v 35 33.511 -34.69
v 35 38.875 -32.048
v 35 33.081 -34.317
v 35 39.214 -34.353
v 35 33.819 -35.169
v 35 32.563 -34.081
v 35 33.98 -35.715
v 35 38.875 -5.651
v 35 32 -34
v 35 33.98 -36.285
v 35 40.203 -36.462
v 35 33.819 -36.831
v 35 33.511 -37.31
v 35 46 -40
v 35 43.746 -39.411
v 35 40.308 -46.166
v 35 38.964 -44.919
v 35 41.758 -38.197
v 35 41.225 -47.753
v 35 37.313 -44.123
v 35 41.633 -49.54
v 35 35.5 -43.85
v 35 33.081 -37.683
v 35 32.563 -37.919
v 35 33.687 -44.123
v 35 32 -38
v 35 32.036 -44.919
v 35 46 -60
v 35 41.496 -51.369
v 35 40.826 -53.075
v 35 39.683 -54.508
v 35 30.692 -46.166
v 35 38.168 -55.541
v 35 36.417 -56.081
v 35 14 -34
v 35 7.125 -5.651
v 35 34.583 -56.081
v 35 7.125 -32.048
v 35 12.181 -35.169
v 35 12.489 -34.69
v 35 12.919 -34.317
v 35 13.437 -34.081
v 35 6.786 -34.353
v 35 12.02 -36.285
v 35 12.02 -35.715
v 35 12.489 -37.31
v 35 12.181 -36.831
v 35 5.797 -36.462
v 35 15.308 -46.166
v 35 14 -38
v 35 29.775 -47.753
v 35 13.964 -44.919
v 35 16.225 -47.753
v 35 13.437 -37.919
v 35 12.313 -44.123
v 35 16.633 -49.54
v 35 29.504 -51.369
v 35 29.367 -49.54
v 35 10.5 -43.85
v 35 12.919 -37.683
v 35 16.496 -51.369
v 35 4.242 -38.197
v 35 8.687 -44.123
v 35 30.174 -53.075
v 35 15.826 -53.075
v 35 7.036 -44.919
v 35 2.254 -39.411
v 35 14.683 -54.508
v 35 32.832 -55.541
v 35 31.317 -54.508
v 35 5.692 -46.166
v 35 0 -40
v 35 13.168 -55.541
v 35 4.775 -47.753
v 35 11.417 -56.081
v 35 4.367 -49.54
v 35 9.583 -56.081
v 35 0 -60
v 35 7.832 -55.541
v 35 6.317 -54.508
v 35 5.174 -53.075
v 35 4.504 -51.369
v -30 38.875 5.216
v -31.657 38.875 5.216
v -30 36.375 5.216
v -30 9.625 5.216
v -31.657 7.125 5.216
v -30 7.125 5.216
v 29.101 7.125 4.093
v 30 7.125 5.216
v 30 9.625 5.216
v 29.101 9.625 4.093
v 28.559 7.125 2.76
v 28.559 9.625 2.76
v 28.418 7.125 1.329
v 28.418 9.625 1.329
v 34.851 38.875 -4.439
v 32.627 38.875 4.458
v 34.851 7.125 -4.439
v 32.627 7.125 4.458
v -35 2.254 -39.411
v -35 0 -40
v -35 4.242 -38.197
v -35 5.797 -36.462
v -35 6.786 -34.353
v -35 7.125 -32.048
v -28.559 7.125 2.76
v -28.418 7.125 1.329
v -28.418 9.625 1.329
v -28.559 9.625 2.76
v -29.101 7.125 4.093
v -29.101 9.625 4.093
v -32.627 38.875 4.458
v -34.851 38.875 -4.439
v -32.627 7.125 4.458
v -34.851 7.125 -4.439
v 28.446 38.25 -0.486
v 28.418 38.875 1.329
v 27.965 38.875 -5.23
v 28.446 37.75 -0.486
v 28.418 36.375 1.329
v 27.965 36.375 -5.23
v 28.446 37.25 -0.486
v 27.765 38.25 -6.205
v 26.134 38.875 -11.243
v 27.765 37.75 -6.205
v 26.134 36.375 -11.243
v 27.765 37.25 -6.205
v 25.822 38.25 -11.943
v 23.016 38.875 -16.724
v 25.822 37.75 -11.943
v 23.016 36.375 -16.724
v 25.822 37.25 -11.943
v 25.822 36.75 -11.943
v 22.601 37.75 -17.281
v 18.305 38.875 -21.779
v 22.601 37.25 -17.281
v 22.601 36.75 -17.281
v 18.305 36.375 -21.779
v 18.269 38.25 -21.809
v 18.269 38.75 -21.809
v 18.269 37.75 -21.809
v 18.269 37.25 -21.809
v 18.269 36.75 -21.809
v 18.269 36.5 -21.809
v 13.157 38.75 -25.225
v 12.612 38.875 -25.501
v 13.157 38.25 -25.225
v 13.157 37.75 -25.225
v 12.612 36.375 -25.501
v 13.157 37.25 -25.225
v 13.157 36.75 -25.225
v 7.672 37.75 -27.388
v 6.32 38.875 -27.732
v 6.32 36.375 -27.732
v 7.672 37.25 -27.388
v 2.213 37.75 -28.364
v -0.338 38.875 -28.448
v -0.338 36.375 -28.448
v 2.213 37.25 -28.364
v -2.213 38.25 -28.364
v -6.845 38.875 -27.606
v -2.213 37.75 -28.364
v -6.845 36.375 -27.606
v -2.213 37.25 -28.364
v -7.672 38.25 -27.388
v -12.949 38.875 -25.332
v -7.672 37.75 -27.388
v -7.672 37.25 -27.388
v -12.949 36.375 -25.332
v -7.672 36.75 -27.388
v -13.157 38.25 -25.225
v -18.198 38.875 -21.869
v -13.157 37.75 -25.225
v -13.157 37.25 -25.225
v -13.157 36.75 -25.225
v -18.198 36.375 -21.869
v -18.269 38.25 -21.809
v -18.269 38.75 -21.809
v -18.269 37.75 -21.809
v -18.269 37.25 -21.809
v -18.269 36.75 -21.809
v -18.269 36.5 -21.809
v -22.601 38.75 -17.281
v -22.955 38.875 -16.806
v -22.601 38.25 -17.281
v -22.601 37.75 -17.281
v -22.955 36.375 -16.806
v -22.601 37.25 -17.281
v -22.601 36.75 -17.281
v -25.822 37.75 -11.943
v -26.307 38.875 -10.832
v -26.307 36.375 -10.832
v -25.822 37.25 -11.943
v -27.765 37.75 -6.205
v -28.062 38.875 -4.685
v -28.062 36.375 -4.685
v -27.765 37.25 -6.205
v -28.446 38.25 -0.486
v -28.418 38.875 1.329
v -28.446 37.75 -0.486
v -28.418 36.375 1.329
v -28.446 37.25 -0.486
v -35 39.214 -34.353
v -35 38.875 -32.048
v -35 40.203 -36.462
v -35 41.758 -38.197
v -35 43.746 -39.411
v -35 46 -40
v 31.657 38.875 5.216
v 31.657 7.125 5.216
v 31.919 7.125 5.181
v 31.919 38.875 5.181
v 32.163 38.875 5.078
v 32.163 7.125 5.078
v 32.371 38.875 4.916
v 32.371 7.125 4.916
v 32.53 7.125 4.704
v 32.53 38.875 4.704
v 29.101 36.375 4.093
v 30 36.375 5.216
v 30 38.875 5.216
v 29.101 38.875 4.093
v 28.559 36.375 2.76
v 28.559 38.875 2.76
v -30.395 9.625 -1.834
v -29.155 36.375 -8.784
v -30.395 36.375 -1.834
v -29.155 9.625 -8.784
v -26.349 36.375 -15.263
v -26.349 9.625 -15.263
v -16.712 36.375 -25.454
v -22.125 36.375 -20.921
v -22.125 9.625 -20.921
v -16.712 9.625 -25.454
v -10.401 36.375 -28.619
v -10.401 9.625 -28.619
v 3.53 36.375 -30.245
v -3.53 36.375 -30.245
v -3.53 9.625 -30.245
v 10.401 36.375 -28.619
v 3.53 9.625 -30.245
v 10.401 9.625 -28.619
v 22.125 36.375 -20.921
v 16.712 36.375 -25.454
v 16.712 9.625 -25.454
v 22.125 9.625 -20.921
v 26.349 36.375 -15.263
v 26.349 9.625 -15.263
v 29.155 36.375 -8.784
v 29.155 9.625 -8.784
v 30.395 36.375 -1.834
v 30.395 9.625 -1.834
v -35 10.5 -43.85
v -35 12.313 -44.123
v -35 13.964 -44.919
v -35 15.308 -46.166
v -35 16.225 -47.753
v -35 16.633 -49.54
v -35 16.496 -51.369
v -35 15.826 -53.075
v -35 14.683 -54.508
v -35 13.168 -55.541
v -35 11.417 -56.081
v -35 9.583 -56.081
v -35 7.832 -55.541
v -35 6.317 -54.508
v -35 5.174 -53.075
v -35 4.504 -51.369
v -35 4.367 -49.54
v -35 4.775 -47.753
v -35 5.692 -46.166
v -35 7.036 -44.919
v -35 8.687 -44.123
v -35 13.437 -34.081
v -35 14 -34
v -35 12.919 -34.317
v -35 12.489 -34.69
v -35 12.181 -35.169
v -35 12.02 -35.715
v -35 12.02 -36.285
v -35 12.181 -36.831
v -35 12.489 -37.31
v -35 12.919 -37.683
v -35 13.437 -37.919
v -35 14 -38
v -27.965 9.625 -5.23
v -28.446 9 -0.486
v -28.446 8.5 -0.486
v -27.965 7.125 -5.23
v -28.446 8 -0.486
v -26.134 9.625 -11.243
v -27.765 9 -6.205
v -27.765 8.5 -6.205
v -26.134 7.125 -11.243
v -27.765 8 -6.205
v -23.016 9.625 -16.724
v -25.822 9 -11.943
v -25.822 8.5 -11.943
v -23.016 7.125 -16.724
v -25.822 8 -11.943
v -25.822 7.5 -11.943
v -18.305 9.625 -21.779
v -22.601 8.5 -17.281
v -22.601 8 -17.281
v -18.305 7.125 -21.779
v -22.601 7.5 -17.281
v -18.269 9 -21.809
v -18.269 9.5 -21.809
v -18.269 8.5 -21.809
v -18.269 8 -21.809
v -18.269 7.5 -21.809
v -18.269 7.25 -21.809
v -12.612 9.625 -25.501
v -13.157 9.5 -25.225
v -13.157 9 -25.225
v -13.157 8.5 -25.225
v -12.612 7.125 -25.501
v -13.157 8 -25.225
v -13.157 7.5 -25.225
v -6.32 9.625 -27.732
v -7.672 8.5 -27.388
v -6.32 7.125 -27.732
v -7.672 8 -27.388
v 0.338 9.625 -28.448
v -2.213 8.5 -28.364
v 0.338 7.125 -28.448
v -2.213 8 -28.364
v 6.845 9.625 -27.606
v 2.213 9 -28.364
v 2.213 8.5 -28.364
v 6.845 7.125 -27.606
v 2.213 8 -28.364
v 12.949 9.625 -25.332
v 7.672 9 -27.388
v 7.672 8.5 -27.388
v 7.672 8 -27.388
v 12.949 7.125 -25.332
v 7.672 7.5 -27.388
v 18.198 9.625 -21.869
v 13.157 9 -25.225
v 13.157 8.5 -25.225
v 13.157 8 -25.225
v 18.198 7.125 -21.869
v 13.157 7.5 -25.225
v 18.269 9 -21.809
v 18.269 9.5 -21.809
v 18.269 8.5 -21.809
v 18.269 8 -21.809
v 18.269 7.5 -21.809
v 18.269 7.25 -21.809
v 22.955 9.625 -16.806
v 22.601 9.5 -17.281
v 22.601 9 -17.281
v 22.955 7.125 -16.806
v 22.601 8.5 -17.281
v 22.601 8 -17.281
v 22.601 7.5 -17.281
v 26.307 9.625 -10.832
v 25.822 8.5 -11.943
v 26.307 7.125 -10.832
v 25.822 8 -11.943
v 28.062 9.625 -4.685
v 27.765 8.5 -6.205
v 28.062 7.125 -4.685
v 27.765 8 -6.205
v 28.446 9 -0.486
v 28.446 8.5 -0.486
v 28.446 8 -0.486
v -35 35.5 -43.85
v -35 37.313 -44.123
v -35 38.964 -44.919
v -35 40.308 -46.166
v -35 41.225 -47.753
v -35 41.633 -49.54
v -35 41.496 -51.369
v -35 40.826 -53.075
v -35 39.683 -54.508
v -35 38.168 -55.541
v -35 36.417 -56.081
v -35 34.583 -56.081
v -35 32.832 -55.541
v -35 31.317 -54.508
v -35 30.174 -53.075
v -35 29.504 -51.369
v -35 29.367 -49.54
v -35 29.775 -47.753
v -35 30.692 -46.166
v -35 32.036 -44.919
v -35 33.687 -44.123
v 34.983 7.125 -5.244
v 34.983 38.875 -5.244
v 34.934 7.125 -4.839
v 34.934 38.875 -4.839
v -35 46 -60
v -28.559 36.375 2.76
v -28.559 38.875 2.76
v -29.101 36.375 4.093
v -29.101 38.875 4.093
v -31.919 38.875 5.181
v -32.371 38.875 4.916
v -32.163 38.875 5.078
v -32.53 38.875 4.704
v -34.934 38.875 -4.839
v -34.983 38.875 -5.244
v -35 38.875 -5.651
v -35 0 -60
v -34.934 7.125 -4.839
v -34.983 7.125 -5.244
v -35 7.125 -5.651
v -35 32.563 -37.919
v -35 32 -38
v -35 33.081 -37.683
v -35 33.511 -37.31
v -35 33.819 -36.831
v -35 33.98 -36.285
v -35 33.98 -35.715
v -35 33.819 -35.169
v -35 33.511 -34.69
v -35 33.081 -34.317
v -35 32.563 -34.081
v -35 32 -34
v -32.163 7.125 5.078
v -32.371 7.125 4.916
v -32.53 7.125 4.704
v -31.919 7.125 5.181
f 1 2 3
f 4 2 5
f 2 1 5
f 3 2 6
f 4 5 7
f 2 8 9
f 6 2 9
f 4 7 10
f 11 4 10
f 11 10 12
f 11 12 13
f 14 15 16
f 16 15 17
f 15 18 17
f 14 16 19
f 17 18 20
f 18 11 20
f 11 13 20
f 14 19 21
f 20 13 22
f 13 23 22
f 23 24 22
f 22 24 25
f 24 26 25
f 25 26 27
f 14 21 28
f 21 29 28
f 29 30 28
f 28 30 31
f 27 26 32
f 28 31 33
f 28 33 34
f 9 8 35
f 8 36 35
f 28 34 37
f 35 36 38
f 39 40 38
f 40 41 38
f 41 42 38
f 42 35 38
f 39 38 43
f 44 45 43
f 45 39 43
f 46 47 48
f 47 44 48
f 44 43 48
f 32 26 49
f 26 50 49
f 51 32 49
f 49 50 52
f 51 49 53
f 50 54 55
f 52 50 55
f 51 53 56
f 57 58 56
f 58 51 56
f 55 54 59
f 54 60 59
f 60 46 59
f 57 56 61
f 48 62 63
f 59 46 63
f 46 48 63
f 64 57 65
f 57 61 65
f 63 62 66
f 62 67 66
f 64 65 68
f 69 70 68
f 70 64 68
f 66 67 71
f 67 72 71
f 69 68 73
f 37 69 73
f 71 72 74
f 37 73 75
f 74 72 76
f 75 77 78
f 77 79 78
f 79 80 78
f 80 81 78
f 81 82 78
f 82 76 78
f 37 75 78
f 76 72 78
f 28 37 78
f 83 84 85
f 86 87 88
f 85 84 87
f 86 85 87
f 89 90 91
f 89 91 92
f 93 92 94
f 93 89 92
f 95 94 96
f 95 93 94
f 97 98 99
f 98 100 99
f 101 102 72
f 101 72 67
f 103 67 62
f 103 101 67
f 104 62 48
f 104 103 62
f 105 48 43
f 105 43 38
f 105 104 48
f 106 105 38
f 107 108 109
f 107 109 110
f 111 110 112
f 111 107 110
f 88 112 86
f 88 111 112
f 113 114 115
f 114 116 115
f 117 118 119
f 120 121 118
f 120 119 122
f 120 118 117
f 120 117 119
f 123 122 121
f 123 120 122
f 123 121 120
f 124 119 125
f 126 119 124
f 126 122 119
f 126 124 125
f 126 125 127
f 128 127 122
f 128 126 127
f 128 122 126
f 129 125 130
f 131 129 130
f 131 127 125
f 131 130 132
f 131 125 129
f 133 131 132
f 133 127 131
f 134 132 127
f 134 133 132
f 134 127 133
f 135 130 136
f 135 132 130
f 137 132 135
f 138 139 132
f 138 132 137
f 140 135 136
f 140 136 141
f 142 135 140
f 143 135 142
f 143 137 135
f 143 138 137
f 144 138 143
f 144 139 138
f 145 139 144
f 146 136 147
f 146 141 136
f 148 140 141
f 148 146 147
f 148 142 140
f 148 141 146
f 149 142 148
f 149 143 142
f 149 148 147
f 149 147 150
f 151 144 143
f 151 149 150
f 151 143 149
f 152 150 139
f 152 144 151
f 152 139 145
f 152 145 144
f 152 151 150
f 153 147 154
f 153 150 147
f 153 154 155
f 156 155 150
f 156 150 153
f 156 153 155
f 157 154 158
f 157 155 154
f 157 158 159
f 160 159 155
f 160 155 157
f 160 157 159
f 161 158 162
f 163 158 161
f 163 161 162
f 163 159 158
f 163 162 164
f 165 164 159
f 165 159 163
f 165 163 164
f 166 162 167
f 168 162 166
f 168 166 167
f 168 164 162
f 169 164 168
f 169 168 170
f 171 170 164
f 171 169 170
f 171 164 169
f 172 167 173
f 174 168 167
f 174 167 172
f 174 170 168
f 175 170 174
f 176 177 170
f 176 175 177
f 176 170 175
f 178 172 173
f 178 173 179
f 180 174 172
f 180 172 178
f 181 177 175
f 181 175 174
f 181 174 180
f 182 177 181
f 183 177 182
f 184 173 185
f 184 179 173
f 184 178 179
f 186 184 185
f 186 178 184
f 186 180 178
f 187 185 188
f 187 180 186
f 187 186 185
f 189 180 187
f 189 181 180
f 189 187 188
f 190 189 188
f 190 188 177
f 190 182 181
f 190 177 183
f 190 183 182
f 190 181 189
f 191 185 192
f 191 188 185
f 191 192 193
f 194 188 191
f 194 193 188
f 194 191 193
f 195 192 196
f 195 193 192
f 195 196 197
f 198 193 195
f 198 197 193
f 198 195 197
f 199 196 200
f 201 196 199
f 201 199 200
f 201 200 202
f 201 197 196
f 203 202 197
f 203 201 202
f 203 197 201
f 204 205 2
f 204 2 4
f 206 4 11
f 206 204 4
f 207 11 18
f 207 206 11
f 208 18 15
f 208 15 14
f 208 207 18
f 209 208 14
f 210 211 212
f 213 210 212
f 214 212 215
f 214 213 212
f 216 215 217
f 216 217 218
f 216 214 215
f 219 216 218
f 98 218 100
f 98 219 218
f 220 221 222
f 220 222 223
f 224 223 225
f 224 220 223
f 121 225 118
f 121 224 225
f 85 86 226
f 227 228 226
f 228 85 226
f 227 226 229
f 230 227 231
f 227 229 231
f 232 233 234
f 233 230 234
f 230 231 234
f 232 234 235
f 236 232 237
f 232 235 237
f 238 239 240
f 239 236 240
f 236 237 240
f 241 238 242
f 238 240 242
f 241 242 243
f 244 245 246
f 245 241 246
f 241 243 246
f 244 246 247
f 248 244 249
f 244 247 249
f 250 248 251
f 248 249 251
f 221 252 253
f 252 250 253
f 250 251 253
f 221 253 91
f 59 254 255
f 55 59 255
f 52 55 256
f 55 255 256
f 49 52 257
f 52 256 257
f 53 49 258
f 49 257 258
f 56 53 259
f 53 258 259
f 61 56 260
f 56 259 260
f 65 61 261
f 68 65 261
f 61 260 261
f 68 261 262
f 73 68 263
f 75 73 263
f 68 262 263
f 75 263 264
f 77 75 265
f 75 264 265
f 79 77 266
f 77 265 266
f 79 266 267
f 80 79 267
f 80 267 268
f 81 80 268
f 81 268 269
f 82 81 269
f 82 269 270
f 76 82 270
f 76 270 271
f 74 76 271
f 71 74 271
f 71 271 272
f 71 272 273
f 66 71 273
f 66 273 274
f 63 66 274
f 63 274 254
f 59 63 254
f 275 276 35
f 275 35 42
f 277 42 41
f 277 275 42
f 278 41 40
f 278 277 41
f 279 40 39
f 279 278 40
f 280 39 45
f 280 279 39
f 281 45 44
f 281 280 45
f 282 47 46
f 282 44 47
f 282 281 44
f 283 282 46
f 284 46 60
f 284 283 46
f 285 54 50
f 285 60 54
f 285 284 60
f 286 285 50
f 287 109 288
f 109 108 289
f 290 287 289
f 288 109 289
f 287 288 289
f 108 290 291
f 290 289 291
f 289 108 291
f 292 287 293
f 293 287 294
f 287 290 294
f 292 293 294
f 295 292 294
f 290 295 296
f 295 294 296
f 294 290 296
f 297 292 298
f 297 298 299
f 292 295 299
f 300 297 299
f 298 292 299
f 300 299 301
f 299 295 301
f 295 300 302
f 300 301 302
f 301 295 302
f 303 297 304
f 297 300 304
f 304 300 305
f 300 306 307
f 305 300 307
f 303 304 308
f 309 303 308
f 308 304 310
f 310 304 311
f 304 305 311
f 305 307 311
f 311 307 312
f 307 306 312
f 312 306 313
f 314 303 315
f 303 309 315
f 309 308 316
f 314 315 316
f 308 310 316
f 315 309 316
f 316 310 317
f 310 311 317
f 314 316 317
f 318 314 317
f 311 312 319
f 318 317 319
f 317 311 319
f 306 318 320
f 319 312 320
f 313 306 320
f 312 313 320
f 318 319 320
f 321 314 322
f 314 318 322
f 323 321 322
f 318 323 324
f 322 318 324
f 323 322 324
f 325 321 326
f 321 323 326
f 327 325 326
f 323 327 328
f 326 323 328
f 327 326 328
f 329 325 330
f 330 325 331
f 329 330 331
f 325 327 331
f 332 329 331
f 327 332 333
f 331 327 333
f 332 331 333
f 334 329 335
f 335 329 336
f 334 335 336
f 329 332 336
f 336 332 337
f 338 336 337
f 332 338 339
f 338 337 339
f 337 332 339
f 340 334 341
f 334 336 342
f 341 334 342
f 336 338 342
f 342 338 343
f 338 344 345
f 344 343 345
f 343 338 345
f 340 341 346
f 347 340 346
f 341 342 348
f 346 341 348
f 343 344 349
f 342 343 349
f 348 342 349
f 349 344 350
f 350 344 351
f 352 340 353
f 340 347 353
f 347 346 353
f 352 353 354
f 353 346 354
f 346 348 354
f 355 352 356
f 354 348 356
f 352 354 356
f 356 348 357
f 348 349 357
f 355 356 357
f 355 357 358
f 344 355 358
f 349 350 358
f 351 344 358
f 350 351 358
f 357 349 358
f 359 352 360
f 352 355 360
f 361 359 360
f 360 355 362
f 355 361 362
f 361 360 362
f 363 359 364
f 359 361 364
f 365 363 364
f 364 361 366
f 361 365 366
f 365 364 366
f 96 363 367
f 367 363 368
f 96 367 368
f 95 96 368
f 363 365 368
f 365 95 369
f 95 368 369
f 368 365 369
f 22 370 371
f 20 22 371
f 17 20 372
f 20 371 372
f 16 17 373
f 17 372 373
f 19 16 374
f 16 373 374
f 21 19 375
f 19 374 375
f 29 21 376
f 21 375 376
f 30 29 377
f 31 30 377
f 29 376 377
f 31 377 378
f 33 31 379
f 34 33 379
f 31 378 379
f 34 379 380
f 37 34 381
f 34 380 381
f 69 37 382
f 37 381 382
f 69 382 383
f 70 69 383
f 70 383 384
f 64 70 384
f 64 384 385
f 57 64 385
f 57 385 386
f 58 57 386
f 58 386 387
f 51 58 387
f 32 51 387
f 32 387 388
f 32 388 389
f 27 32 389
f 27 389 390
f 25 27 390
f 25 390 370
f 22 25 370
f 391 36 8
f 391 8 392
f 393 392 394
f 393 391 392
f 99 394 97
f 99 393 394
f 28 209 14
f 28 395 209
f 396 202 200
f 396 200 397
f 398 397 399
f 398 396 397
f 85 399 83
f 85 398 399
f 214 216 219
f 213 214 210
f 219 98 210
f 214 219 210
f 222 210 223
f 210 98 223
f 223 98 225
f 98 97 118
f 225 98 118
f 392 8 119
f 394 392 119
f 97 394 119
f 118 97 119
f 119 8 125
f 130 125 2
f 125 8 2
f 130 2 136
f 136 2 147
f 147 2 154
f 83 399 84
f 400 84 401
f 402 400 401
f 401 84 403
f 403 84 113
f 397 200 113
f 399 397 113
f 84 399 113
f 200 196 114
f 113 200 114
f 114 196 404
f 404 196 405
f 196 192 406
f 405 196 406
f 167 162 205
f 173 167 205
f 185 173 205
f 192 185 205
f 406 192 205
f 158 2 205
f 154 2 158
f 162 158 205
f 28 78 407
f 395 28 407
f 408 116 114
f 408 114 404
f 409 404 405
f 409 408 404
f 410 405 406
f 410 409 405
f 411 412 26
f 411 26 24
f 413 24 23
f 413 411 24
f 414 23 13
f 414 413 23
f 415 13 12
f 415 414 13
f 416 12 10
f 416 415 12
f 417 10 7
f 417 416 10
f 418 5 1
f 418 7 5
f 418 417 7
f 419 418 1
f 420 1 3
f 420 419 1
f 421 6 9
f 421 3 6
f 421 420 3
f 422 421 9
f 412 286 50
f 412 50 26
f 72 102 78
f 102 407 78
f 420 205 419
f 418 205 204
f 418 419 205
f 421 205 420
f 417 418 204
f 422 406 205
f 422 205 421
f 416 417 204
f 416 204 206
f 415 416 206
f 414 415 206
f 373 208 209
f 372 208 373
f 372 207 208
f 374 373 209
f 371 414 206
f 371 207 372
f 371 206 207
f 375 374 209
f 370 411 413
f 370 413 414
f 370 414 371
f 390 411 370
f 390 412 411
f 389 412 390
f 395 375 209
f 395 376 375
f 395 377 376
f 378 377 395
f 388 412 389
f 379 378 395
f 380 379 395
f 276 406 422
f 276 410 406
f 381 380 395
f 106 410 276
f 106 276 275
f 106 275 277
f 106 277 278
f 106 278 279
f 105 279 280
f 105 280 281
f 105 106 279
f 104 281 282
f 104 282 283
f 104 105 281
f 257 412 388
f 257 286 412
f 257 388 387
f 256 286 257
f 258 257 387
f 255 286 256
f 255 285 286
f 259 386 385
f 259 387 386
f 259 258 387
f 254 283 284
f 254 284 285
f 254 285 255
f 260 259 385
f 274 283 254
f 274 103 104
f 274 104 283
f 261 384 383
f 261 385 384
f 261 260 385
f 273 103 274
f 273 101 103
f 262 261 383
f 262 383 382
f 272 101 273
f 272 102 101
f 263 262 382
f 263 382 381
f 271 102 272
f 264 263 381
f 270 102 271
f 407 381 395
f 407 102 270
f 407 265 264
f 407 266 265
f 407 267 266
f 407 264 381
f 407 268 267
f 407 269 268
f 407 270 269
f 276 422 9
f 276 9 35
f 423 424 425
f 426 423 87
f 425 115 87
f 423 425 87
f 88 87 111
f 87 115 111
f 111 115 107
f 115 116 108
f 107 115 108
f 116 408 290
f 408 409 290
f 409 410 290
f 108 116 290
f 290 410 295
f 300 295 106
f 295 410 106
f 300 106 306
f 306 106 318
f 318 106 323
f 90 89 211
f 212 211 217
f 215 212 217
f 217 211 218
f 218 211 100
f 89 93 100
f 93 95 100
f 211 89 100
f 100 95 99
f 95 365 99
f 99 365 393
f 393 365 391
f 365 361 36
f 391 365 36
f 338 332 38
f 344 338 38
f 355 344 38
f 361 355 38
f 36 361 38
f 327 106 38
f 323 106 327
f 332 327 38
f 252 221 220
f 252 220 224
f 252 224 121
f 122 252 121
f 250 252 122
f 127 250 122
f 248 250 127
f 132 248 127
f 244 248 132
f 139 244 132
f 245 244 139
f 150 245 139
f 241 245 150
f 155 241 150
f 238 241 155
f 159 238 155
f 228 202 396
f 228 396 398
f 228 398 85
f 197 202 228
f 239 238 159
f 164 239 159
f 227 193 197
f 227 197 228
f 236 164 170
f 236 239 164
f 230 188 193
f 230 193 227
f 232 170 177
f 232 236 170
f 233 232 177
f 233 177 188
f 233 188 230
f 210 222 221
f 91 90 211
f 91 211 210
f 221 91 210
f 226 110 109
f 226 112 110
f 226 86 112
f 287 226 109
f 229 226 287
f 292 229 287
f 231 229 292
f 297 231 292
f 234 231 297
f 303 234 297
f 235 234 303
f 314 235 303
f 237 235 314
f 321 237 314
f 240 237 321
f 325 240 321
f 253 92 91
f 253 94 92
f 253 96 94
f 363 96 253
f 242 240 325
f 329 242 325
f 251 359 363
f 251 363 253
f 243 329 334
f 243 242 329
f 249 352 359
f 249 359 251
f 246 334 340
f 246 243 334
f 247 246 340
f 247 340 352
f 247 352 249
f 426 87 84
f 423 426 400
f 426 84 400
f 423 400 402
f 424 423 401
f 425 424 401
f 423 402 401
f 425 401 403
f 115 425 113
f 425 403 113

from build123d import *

# Parameters (mm, degrees)
BOSS_EXTRUDE2_DEPTH = 46
SKETCH4_R           = 6.15
CUT_EXTRUDE1_DEPTH  = 104.033974979
SKETCH6_W           = 45.215601595
SKETCH6_H           = 7.125
CUT_EXTRUDE2_DEPTH  = 104.033974979
CUT_EXTRUDE3_DEPTH  = 104.033974979
FILLET1_R           = 8
THICKEN1_START      = 7.125
THICKEN1_DEPTH      = 2.5
THICKEN2_START      = 36.375
THICKEN2_DEPTH      = 2.5
FILLET3_START       = 6
FILLET3_DEPTH       = 34
FILLET4_R           = 1


with BuildPart() as part:
    # Sketch3 → Boss-Extrude2 (new body)
    with BuildSketch(Plane(origin=(0, 0, 0), x_dir=(1, 0, 0), z_dir=(0, 1, 0))):
        with BuildLine():
            Line((35, 5.035917613), (35, 60))
            Line((35, 60), (-35, 60))
            Line((-35, 60), (-35, 5.035917613))
            Line((-35, 5.035917613), (-32.437862919, -5.215601595))
            Line((-32.437862919, -5.215601595), (-30, -5.215601595))
            ThreePointArc((-30, -5.215601595), (0, 30.45), (30, -5.215601595))
            Line((30, -5.215601595), (32.437862919, -5.215601595))
            Line((32.437862919, -5.215601595), (35, 5.035917613))
        make_face()
    extrude(amount=BOSS_EXTRUDE2_DEPTH)

    # Sketch4 → Cut-Extrude1 (cut, through all)
    with BuildSketch(Plane.ZY.offset(35)):
        with Locations((-50, 35.5)):
            Circle(SKETCH4_R)
        with Locations((-50, 10.5)):
            Circle(SKETCH4_R)
    extrude(amount=-CUT_EXTRUDE1_DEPTH, mode=Mode.SUBTRACT)

    # Sketch6 → Cut-Extrude2 (cut, through all)
    with BuildSketch(Plane.ZY.offset(35)):
        with Locations((-17.392199202, 42.4375)):
            Rectangle(SKETCH6_W, SKETCH6_H)
        with Locations((-17.392199202, 3.5625)):
            Rectangle(SKETCH6_W, SKETCH6_H)
    extrude(amount=-CUT_EXTRUDE2_DEPTH, mode=Mode.SUBTRACT)

    # Sketch7 → Cut-Extrude3 (cut, through all)
    with BuildSketch(Plane.ZY.offset(35)):
        with BuildLine():
            Line((-34, 32), (-34, 14))
            ThreePointArc((-34, 14), (-36, 12), (-38, 14))
            Line((-38, 14), (-38, 32))
            ThreePointArc((-38, 32), (-36, 34), (-34, 32))
        make_face()
    extrude(amount=-CUT_EXTRUDE3_DEPTH, mode=Mode.SUBTRACT)

    # Fillet1
    # the kernel refuses this fillet: 8 mm, written as the material it adds along each edge
    with BuildSketch(Plane(origin=(-35, 38.875, -40), x_dir=(0, 0, 1), z_dir=(1, 0, 0))) as fillet1_piece_1:
        with BuildLine():
            CenterArc((7.952004464, -8), FILLET1_R, 90, 83.720711677)
            Line((0, -7.125), (-0.159040089, -7.1075))
            ThreePointArc((-0.159040089, -7.1075), (-0.16, -3.5625), (-0.16, 0))
            Line((-0.16, 0), (0, 0.16))
            Line((0, 0.16), (7.952004464, 0.16))
            Line((7.952004464, 0.16), (7.952004464, 0))
        make_face()
    extrude(amount=70)
    with BuildSketch(Plane(origin=(-35, 7.125, -40), x_dir=(0, 0, 1), z_dir=(1, 0, 0))) as fillet1_piece_2:
        with BuildLine():
            CenterArc((7.952004464, 8), FILLET1_R, 186.279288323, 83.720711677)
            Line((0, 7.125), (-0.159040089, 7.1075))
            ThreePointArc((-0.159040089, 7.1075), (-0.16, 3.5625), (-0.16, 0))
            Line((-0.16, 0), (0, -0.16))
            Line((0, -0.16), (7.952004464, -0.16))
            Line((7.952004464, -0.16), (7.952004464, 0))
        make_face()
    extrude(amount=70)

    # Thicken1: read off the stored shape, not the designer's step
    # Thicken1 outline → Thicken1 (add)
    with BuildSketch(Plane(origin=(0, 0, 0), x_dir=(1, 0, 0), z_dir=(0, 1, 0)).offset(THICKEN1_START)):
        with BuildLine():
            Line((-30, -5.215601595), (-28.02955665, -4.873033346))
            add(Edge.make_bspline(
                [(-28.02955665, -4.873033346), (-28.098227513, -4.44491985), (-28.235569238, -3.588692857), (-28.415182418, -1.817508912), (-28.523288215, 1.384964463), (-27.97944925, 6.199907689), (-26.040449122, 12.009579762), (-22.790232653, 17.418782717), (-18.402164664, 21.998309903), (-11.490033606, 26.589068444), (-4.952214398, 28.293358132), (-0.733661392, 28.45), (0.733661392, 28.45), (4.952214398, 28.293358132), (11.490033606, 26.589068444), (18.402164664, 21.998309903), (22.790232653, 17.418782717), (26.040449122, 12.009579762), (27.97944925, 6.199907689), (28.523288215, 1.384964463), (28.415182418, -1.817508912), (28.235569238, -3.588692857), (28.098227513, -4.44491985), (28.02955665, -4.873033346)],
                knots=[0, 0, 0, 0, 0.01484375, 0.0296875, 0.059375, 0.11875, 0.178125, 0.2375, 0.296875, 0.35625, 0.475, 0.5, 0.5, 0.525, 0.64375, 0.703125, 0.7625, 0.821875, 0.88125, 0.940625, 0.9703125, 0.98515625, 1, 1, 1, 1], degree=3))
            Line((28.02955665, -4.873033346), (30, -5.215601595))
            ThreePointArc((30, -5.215601595), (0, 30.45), (-30, -5.215601595))
        make_face()
    extrude(amount=THICKEN1_DEPTH)

    # Thicken2: read off the stored shape, not the designer's step
    # Thicken2 outline → Thicken2 (add)
    with BuildSketch(Plane(origin=(0, 0, 0), x_dir=(1, 0, 0), z_dir=(0, 1, 0)).offset(THICKEN2_START)):
        with BuildLine():
            add(Edge.make_bspline(
                [(28.02955665, -4.873033346), (28.098227513, -4.44491985), (28.235569238, -3.588692857), (28.415182418, -1.817508912), (28.523288215, 1.384964463), (27.97944925, 6.199907689), (26.040449122, 12.009579762), (22.790232653, 17.418782717), (18.402164664, 21.998309903), (11.490033606, 26.589068444), (4.952214398, 28.293358132), (0.733661392, 28.45), (-0.733661392, 28.45), (-4.952214398, 28.293358132), (-11.490033606, 26.589068444), (-18.402164664, 21.998309903), (-22.790232653, 17.418782717), (-26.040449122, 12.009579762), (-27.97944925, 6.199907689), (-28.523288215, 1.384964463), (-28.415182418, -1.817508912), (-28.235569238, -3.588692857), (-28.098227513, -4.44491985), (-28.02955665, -4.873033346)],
                knots=[0, 0, 0, 0, 0.01484375, 0.0296875, 0.059375, 0.11875, 0.178125, 0.2375, 0.296875, 0.35625, 0.475, 0.5, 0.5, 0.525, 0.64375, 0.703125, 0.7625, 0.821875, 0.88125, 0.940625, 0.9703125, 0.98515625, 1, 1, 1, 1], degree=3))
            Line((28.02955665, -4.873033346), (30, -5.215601595))
            ThreePointArc((30, -5.215601595), (0, 30.45), (-30, -5.215601595))
            Line((-30, -5.215601595), (-28.02955665, -4.873033346))
        make_face()
    extrude(amount=THICKEN2_DEPTH)

    # Fillet3: read off the stored shape, not the designer's step
    # Fillet3 outline → Fillet3 (cut)
    with BuildSketch(Plane(origin=(0, 0, 0), x_dir=(1, 0, 0), z_dir=(0, 1, 0)).offset(FILLET3_START)):
        with BuildLine():
            Line((35, 5.035917613), (35, 5.651272685))
            ThreePointArc((35, 5.651272685), (34.962558609, 5.040525563), (34.850795181, 4.438925329))
            Line((34.850795181, 4.438925329), (35, 5.035917613))
        make_face()
        with BuildLine():
            Line((-35, 5.035917613), (-34.850795181, 4.438925329))
            ThreePointArc((-34.850795181, 4.438925329), (-34.962558609, 5.040525563), (-35, 5.651272685))
            Line((-35, 5.651272685), (-35, 5.035917613))
        make_face()
        with BuildLine():
            add(Edge.make_bspline(
                [(-28.02955665, -4.873033346), (-28.098227513, -4.44491985), (-28.235569238, -3.588692857), (-28.356138896, -2.399743128), (-28.403921261, -1.639675399), (-28.418446433, -1.328505626)],
                knots=[0, 0, 0, 0, 0.01484375, 0.0296875, 0.039856894, 0.039856894, 0.039856894, 0.039856894], degree=3))
            ThreePointArc((-28.418446433, -1.328505626), (-28.781681481, -3.446008708), (-30, -5.215601595))
            Line((-30, -5.215601595), (-28.02955665, -4.873033346))
        make_face()
        with BuildLine():
            ThreePointArc((30, -5.215601595), (28.781681481, -3.446008708), (28.418446433, -1.328505626))
            add(Edge.make_bspline(
                [(28.418446433, -1.328505626), (28.403921261, -1.639675399), (28.356138896, -2.399743128), (28.235569238, -3.588692857), (28.098227513, -4.44491985), (28.02955665, -4.873033346)],
                knots=[0.960143106, 0.960143106, 0.960143106, 0.960143106, 0.9703125, 0.98515625, 1, 1, 1, 1], degree=3))
            Line((28.02955665, -4.873033346), (30, -5.215601595))
        make_face()
    extrude(amount=FILLET3_DEPTH, mode=Mode.SUBTRACT)

    # Fillet4
    fillet4_edges = [part.edges().sort_by_distance(p)[0] for p in [
        (-32.437862919, 23, 5.215601595),
        (32.437862919, 23, 5.215601595),
    ]]
    fillet(fillet4_edges, radius=FILLET4_R)


solid = part.part
